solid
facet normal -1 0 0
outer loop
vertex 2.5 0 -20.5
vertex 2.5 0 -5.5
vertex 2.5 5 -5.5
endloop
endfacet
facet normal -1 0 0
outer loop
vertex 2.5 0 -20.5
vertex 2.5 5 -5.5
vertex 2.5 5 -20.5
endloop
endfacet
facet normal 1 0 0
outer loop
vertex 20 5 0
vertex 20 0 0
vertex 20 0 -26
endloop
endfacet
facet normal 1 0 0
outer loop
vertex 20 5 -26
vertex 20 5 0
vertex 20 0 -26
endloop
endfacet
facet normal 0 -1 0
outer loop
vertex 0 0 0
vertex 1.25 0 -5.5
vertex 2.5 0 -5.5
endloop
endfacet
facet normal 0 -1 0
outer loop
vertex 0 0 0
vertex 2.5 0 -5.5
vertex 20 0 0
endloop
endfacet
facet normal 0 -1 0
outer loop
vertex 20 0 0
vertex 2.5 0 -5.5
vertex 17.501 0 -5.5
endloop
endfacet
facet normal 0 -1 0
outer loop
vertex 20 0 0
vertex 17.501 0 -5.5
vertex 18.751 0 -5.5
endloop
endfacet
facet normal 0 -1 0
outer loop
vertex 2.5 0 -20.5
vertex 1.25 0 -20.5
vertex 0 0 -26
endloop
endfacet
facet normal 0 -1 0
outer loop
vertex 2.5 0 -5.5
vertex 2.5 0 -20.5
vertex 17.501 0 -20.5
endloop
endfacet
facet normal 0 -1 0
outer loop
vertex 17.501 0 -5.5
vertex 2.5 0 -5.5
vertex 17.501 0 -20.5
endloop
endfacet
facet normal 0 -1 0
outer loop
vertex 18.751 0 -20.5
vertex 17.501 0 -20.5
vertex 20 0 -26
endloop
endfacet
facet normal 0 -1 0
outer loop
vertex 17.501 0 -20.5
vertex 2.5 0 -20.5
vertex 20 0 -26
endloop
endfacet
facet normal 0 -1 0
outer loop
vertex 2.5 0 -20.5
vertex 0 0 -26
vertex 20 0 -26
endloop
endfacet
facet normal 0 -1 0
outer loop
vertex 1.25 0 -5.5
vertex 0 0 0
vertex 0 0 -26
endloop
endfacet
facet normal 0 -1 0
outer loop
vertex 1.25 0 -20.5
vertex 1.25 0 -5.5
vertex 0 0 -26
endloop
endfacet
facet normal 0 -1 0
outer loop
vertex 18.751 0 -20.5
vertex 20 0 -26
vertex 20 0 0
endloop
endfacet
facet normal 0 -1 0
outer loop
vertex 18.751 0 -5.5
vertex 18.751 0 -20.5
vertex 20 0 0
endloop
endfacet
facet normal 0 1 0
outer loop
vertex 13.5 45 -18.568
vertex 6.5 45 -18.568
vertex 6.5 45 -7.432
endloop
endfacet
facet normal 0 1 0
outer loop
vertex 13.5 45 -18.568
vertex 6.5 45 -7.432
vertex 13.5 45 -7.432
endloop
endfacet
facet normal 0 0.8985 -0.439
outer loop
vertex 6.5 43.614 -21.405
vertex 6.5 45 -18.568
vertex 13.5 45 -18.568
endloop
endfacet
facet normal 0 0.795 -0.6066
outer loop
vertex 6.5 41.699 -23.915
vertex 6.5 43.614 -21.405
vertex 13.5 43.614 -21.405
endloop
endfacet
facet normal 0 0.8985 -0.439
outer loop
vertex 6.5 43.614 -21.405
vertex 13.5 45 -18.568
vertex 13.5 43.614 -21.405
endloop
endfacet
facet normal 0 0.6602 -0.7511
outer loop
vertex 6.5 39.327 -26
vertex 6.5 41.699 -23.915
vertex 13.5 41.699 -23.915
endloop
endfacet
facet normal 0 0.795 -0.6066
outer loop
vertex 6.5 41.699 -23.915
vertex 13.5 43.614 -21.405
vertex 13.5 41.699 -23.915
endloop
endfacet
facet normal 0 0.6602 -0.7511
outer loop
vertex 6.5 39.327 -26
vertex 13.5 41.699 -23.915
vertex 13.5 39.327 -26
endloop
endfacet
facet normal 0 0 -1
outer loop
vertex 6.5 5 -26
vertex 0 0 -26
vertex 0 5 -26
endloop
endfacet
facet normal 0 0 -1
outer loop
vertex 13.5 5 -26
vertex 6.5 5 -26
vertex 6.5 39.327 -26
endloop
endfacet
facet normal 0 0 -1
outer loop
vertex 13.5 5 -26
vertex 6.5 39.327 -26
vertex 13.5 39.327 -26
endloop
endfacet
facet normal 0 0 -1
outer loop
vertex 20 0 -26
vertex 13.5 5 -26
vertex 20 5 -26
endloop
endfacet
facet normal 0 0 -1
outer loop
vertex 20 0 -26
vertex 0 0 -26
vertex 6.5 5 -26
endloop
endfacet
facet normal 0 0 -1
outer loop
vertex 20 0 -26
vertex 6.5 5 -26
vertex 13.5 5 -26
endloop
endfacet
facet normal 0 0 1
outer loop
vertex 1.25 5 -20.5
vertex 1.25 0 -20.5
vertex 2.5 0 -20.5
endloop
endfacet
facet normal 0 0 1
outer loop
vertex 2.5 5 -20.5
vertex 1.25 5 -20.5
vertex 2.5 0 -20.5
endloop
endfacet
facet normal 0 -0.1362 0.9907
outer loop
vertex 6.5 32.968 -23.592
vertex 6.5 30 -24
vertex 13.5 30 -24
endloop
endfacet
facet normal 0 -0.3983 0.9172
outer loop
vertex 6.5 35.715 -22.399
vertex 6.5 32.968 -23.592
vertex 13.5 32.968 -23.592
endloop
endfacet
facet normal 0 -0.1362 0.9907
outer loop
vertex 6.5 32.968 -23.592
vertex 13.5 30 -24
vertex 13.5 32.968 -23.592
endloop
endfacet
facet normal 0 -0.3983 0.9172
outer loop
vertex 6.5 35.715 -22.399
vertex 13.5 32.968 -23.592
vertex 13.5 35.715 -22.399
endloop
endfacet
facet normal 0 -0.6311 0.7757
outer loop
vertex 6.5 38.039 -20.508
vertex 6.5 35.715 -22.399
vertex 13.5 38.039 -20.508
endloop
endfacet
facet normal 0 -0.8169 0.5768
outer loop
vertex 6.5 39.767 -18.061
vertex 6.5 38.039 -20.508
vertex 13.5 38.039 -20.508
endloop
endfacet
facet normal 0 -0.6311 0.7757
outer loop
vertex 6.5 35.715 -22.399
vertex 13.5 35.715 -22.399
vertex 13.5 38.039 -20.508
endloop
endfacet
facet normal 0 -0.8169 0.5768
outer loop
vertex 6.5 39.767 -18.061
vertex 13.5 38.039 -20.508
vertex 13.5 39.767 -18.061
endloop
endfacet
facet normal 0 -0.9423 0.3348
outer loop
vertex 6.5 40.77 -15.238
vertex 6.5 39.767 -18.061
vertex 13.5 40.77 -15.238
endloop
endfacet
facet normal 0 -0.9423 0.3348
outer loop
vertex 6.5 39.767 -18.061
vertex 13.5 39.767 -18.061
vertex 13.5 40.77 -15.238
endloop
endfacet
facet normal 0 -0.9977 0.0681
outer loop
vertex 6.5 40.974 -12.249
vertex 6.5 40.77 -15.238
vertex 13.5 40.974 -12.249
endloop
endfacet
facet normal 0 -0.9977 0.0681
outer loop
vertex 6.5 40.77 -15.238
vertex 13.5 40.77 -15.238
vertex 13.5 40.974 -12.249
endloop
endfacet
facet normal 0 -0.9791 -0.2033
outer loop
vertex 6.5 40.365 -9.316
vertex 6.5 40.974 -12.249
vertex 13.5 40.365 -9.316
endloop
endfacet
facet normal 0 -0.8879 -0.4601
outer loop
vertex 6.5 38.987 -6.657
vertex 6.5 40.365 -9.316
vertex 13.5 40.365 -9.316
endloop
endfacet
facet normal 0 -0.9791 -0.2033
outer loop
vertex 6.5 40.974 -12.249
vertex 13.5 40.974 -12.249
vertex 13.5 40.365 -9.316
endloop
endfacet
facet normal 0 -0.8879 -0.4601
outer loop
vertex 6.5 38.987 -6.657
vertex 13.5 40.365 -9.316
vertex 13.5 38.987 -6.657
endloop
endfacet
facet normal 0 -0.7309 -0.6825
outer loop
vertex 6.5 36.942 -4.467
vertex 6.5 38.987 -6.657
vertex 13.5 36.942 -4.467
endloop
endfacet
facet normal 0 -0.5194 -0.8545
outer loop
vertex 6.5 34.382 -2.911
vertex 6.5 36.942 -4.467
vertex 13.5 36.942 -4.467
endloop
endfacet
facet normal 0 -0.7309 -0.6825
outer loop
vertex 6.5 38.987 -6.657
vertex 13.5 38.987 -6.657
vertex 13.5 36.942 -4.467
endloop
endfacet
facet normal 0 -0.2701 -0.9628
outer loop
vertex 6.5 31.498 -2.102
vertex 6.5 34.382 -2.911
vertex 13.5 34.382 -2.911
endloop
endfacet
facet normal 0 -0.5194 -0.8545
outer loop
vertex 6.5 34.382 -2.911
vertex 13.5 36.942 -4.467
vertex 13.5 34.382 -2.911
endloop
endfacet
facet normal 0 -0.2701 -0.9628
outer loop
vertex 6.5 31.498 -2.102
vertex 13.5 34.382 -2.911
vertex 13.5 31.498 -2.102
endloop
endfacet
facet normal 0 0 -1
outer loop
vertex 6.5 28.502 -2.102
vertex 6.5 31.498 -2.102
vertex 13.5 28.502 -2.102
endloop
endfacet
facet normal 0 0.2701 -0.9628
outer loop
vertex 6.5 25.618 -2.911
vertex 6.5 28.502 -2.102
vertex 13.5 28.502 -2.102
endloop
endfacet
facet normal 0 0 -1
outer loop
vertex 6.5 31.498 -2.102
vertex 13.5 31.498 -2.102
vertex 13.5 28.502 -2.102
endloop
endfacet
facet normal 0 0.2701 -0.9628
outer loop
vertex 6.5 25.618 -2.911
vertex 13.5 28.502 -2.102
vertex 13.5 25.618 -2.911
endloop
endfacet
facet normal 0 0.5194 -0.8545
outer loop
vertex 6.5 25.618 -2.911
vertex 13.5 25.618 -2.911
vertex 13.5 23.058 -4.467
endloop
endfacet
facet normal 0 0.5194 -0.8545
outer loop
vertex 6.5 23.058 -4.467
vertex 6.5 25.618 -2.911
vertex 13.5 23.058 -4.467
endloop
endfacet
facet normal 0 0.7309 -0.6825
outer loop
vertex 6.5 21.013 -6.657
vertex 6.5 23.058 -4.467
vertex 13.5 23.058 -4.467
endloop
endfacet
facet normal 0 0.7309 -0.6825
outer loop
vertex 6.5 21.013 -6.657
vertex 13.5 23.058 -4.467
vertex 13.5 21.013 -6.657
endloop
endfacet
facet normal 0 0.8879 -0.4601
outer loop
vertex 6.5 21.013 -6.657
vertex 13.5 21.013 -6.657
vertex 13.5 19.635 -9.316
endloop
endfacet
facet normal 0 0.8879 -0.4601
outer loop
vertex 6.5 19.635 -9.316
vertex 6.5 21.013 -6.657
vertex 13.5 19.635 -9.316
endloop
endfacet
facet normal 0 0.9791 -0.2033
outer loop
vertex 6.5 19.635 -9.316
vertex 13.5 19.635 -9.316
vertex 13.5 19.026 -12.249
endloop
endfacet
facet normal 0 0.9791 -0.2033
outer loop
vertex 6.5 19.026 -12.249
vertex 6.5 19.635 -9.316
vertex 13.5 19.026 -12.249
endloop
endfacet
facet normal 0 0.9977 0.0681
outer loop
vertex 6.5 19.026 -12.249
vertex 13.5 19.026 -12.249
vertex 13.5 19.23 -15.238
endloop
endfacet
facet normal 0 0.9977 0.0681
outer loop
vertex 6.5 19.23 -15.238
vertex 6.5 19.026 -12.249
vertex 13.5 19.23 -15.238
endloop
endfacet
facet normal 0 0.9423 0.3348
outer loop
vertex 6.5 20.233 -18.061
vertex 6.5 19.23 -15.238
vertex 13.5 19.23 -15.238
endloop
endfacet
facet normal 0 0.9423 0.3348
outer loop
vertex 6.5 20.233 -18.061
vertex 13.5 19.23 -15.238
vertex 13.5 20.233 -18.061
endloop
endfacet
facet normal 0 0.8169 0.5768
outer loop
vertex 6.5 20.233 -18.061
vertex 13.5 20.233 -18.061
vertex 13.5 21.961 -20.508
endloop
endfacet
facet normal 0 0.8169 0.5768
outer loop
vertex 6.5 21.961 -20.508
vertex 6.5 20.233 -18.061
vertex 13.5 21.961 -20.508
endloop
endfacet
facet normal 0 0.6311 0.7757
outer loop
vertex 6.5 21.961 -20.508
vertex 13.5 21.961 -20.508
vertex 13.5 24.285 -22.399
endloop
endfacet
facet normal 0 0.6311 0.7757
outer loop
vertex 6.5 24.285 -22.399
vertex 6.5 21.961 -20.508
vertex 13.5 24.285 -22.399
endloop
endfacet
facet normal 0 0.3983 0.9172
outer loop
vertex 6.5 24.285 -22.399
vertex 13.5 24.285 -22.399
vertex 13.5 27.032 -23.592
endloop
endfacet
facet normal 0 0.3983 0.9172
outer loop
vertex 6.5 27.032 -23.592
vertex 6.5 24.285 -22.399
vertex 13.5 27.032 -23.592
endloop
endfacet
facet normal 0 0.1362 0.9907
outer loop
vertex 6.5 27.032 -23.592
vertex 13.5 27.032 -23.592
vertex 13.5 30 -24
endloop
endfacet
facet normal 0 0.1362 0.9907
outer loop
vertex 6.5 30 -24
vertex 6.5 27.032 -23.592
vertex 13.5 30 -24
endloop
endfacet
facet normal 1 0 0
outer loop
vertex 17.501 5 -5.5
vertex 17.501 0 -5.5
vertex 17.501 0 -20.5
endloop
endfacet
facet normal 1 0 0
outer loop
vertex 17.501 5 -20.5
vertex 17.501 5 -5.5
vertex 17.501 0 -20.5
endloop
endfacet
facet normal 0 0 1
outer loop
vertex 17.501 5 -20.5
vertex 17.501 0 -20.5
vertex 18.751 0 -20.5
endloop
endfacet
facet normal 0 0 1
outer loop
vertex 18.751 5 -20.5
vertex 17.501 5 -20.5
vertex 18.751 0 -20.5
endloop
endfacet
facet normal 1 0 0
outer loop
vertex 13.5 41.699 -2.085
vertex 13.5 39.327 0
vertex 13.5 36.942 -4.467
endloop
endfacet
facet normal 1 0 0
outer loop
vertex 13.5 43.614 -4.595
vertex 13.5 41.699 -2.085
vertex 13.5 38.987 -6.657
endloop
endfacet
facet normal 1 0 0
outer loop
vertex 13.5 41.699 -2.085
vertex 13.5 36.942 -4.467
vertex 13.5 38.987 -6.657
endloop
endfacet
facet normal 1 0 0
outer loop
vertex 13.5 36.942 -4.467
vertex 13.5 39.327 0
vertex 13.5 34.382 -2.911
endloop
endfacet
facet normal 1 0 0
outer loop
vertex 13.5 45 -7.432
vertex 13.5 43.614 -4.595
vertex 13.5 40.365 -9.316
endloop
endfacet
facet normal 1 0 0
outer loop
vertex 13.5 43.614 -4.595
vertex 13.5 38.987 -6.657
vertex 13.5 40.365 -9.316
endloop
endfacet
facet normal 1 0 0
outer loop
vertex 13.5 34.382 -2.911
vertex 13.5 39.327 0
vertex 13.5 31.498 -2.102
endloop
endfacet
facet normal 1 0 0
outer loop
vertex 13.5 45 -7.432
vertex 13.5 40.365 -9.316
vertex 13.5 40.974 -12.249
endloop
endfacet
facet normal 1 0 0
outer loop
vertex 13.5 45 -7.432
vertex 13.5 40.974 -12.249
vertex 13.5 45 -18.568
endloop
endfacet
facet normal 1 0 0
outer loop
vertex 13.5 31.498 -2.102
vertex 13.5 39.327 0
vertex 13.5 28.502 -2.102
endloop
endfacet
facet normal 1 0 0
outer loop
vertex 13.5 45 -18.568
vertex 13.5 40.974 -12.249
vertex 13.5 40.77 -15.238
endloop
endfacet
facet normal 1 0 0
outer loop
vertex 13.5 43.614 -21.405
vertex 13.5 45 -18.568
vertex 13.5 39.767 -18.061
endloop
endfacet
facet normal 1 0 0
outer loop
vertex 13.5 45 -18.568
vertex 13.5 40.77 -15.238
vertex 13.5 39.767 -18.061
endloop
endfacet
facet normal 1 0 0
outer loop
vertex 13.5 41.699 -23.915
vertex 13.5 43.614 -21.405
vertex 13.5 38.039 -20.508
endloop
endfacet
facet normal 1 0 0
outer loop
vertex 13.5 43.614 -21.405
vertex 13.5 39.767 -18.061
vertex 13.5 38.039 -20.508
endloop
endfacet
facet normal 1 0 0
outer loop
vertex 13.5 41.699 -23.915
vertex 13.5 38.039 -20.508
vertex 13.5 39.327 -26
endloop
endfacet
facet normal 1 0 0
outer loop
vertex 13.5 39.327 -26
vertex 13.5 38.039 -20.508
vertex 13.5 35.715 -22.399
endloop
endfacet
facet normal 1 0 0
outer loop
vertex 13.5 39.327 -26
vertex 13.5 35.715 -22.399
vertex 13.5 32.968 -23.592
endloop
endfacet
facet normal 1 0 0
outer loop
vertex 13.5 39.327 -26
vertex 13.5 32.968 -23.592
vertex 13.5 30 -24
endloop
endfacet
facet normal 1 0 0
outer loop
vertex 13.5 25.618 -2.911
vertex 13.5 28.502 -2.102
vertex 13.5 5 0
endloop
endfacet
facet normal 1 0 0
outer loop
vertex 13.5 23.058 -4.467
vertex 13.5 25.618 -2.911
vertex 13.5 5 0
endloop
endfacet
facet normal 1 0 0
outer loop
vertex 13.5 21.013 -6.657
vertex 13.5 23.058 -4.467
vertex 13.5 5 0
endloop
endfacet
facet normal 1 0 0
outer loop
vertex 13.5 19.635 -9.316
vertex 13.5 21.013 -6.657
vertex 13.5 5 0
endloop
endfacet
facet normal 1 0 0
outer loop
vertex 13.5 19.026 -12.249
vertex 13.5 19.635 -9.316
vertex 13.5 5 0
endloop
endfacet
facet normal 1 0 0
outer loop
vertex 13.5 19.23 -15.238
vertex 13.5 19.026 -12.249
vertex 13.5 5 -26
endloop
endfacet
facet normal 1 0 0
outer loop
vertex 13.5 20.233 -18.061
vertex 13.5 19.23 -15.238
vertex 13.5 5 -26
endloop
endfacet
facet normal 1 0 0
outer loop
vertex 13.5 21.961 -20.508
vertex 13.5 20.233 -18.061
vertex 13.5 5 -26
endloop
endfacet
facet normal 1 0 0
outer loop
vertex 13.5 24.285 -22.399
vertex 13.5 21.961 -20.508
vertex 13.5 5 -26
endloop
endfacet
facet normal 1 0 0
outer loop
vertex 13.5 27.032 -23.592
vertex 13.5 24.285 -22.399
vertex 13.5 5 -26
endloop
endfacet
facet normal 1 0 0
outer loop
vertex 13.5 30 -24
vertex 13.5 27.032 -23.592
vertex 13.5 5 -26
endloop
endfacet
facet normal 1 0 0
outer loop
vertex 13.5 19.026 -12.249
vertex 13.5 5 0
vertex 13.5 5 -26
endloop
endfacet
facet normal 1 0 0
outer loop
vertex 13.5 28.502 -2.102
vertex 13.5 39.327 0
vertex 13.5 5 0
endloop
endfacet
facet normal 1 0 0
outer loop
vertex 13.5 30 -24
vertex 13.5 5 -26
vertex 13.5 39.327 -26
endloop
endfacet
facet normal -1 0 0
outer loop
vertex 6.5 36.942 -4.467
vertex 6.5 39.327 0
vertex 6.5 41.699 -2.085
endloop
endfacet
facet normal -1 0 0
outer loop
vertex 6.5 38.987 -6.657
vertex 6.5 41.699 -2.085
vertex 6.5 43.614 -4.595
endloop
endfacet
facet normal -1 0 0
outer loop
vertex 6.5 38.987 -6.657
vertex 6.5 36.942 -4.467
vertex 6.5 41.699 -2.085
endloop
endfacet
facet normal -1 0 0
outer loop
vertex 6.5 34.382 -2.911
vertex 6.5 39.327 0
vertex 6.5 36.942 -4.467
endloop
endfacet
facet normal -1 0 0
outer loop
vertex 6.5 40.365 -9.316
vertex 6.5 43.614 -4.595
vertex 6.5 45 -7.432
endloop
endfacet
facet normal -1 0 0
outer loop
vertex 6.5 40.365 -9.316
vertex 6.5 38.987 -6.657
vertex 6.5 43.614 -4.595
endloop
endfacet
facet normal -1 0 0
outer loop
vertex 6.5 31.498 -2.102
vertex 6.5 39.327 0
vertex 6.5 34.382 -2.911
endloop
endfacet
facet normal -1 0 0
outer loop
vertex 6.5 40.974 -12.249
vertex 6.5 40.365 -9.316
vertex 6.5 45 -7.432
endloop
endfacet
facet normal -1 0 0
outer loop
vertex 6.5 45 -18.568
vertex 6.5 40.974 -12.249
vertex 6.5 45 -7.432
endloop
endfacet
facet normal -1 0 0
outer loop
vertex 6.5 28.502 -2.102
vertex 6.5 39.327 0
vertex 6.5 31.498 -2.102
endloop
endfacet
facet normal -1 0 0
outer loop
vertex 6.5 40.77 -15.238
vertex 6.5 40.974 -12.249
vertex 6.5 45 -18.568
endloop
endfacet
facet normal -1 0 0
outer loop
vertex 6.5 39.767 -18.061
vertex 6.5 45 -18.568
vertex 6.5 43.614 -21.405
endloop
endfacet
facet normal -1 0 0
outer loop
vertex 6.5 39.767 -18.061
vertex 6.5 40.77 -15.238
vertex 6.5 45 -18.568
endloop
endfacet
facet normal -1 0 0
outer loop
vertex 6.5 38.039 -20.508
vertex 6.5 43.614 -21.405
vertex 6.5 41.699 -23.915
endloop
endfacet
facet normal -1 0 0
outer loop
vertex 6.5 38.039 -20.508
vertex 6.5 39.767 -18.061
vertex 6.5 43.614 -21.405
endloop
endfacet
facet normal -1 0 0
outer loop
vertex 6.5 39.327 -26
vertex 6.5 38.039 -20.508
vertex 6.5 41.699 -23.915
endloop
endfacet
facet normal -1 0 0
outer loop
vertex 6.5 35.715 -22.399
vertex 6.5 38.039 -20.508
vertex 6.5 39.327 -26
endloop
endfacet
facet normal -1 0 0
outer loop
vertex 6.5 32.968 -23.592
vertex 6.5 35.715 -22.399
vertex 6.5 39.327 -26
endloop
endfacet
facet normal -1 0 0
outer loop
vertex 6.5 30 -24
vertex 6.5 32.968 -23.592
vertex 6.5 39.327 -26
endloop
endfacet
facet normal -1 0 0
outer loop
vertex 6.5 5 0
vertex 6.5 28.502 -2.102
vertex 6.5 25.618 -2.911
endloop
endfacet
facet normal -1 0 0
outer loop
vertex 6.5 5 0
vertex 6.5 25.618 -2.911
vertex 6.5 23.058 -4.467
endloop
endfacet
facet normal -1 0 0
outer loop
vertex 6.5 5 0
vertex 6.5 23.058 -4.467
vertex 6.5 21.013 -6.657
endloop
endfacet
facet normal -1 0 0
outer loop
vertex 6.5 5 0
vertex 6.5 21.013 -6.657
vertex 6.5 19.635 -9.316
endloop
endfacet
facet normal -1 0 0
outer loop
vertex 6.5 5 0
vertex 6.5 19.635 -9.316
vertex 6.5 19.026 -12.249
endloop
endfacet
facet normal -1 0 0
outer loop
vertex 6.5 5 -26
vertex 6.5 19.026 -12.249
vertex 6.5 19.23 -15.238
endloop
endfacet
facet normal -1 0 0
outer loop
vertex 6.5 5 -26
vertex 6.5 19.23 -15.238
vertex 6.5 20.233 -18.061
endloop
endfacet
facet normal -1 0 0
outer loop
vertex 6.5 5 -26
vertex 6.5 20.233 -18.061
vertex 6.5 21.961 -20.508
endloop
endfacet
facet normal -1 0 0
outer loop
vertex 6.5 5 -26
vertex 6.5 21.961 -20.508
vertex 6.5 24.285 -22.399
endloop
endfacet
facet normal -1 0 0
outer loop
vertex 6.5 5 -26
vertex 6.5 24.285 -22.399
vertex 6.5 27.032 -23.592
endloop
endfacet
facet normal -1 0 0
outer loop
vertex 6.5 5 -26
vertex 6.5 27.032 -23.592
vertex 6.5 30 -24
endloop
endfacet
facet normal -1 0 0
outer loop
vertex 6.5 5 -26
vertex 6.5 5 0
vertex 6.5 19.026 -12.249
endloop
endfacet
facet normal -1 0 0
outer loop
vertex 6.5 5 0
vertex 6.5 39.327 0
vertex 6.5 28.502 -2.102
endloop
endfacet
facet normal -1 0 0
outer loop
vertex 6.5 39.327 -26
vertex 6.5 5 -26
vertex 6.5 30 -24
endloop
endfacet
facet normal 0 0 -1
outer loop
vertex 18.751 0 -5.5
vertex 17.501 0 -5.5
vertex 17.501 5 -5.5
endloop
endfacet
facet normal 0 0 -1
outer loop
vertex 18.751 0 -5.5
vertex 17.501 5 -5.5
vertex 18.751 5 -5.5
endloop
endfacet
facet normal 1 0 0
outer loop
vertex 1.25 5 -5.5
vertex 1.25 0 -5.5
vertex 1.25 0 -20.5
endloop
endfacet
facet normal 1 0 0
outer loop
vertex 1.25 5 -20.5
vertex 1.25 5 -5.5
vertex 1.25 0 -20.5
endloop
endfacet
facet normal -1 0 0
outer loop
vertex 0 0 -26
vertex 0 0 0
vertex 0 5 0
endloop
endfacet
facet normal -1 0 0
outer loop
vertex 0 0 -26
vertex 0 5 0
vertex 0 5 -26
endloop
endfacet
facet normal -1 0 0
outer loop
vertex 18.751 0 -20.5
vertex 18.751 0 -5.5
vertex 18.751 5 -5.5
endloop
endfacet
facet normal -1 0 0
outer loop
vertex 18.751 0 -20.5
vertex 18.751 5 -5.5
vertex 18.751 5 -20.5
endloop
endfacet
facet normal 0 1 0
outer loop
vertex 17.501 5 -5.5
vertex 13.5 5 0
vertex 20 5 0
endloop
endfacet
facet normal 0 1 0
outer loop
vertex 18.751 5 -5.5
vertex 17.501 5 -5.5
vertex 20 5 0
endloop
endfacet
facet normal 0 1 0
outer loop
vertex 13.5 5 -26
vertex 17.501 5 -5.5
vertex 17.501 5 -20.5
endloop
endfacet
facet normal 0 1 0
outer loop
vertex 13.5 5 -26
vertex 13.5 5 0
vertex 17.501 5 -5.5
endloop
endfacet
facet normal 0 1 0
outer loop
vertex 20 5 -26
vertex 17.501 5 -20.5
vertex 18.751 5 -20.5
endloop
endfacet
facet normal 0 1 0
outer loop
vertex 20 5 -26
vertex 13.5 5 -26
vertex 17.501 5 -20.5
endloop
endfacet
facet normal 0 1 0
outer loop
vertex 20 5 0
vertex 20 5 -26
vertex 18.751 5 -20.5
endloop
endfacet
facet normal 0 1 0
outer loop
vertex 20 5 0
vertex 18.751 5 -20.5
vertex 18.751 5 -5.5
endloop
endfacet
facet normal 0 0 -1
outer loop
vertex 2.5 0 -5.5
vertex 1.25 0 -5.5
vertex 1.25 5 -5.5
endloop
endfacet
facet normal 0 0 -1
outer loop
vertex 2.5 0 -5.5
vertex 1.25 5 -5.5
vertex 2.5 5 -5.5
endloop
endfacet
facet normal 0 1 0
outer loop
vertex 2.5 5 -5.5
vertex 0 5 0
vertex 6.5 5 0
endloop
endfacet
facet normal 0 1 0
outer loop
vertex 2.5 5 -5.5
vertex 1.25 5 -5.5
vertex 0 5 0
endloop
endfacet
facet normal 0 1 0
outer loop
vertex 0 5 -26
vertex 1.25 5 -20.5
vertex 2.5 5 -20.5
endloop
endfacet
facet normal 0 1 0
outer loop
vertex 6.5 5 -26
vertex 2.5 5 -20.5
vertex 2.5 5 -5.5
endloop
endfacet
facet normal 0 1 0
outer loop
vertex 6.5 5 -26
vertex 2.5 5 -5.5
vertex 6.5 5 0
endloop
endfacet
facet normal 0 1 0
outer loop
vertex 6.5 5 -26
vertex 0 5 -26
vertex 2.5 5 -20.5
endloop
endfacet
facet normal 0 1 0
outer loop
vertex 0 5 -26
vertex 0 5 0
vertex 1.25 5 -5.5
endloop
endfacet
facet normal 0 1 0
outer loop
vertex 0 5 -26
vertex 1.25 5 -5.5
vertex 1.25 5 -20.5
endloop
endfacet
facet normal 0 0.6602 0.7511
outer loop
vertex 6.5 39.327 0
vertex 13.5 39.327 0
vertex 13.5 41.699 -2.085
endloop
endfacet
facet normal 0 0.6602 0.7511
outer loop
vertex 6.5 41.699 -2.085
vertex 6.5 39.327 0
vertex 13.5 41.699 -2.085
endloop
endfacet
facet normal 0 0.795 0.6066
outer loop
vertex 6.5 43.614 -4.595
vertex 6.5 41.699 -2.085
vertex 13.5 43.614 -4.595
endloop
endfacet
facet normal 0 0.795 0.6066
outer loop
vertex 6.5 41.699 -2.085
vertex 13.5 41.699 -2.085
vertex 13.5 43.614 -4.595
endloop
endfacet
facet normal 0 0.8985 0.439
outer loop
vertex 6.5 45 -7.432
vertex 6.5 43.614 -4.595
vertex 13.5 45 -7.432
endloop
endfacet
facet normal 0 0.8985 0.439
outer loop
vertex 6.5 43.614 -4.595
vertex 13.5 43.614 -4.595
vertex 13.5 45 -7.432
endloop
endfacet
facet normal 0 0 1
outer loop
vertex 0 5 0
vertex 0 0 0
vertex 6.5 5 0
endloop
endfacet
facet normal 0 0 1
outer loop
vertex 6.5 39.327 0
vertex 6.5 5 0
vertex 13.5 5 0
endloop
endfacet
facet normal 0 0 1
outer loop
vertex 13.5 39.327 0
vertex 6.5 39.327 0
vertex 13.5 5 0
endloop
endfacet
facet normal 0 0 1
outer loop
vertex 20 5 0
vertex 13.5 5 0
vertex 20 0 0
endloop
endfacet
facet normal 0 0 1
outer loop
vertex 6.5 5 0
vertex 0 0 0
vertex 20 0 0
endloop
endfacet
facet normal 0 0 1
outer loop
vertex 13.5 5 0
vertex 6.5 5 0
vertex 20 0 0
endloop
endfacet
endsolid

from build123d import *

# Parameters (mm, degrees)
SKETCH1_W           = 20
SKETCH1_H           = 26
SKETCH1_W_2         = 1.25
SKETCH1_H_2         = 15
BOSS_EXTRUDE5_DEPTH = 5
SKETCH3_W           = 7
SKETCH3_H           = 26
BOSS_EXTRUDE6_DEPTH = 40
CUT_EXTRUDE1_REACH  = 55.696
SKETCH5_R           = 11


with BuildPart() as part:
    # Sketch1 → Boss-Extrude5 (new body)
    with BuildSketch(Plane(origin=(0, 0, 0), x_dir=(1, 0, 0), z_dir=(0, 1, 0))):
        with Locations((10, 13)):
            Rectangle(SKETCH1_W, SKETCH1_H)
        with Locations((1.875, 13)):
            Rectangle(SKETCH1_W_2, SKETCH1_H_2, mode=Mode.SUBTRACT)
        with Locations((18.125784532, 13)):
            Rectangle(SKETCH1_W_2, SKETCH1_H_2, mode=Mode.SUBTRACT)
    extrude(amount=BOSS_EXTRUDE5_DEPTH)

    # Sketch3 → Boss-Extrude6 (add)
    with BuildSketch(Plane(origin=(0, 5, 0), x_dir=(1, 0, 0), z_dir=(0, 1, 0))):
        with Locations((10, 13)):
            Rectangle(SKETCH3_W, SKETCH3_H)
    extrude(amount=BOSS_EXTRUDE6_DEPTH)

    # Sketch5 → Cut-Extrude1 (cut, up to next)
    with BuildSketch(Plane(origin=(13.5, 0, 0), x_dir=(0, 0, -1), z_dir=(1, 0, 0)), mode=Mode.PRIVATE) as cut_extrude1_sk1:
        with Locations((13, 30)):
            Circle(SKETCH5_R)
    cut_extrude1_tool1 = extrude(cut_extrude1_sk1.sketch, amount=-CUT_EXTRUDE1_REACH, mode=Mode.PRIVATE) & part.part
    # Sketch5 → Cut-Extrude1 (cut, up to next)
    with BuildSketch(Plane(origin=(13.5, 0, 0), x_dir=(0, 0, -1), z_dir=(1, 0, 0)), mode=Mode.PRIVATE) as cut_extrude1_sk2:
        with BuildLine():
            Line((7.432235637, 45), (0, 45))
            Line((0, 45), (0, 39.327379053))
            ThreePointArc((0, 39.327379053), (3.292522189, 42.718682107), (7.432235637, 45))
        make_face()
    cut_extrude1_tool2 = extrude(cut_extrude1_sk2.sketch, amount=-CUT_EXTRUDE1_REACH, mode=Mode.PRIVATE) & part.part
    # Sketch5 → Cut-Extrude1 (cut, up to next)
    with BuildSketch(Plane(origin=(13.5, 0, 0), x_dir=(0, 0, -1), z_dir=(1, 0, 0)), mode=Mode.PRIVATE) as cut_extrude1_sk3:
        with BuildLine():
            Line((26, 39.327379053), (26, 45))
            Line((26, 45), (18.567764363, 45))
            ThreePointArc((18.567764363, 45), (22.707477811, 42.718682107), (26, 39.327379053))
        make_face()
    cut_extrude1_tool3 = extrude(cut_extrude1_sk3.sketch, amount=-CUT_EXTRUDE1_REACH, mode=Mode.PRIVATE) & part.part
    add(cut_extrude1_tool1.solids().sort_by_distance((13.5, 30, -13))[0], mode=Mode.SUBTRACT)
    add(cut_extrude1_tool2.solids().sort_by_distance((13.5, 43.298273, -2.197768))[0], mode=Mode.SUBTRACT)
    add(cut_extrude1_tool3.solids().sort_by_distance((13.5, 43.298273, -23.802232))[0], mode=Mode.SUBTRACT)


solid = part.part
